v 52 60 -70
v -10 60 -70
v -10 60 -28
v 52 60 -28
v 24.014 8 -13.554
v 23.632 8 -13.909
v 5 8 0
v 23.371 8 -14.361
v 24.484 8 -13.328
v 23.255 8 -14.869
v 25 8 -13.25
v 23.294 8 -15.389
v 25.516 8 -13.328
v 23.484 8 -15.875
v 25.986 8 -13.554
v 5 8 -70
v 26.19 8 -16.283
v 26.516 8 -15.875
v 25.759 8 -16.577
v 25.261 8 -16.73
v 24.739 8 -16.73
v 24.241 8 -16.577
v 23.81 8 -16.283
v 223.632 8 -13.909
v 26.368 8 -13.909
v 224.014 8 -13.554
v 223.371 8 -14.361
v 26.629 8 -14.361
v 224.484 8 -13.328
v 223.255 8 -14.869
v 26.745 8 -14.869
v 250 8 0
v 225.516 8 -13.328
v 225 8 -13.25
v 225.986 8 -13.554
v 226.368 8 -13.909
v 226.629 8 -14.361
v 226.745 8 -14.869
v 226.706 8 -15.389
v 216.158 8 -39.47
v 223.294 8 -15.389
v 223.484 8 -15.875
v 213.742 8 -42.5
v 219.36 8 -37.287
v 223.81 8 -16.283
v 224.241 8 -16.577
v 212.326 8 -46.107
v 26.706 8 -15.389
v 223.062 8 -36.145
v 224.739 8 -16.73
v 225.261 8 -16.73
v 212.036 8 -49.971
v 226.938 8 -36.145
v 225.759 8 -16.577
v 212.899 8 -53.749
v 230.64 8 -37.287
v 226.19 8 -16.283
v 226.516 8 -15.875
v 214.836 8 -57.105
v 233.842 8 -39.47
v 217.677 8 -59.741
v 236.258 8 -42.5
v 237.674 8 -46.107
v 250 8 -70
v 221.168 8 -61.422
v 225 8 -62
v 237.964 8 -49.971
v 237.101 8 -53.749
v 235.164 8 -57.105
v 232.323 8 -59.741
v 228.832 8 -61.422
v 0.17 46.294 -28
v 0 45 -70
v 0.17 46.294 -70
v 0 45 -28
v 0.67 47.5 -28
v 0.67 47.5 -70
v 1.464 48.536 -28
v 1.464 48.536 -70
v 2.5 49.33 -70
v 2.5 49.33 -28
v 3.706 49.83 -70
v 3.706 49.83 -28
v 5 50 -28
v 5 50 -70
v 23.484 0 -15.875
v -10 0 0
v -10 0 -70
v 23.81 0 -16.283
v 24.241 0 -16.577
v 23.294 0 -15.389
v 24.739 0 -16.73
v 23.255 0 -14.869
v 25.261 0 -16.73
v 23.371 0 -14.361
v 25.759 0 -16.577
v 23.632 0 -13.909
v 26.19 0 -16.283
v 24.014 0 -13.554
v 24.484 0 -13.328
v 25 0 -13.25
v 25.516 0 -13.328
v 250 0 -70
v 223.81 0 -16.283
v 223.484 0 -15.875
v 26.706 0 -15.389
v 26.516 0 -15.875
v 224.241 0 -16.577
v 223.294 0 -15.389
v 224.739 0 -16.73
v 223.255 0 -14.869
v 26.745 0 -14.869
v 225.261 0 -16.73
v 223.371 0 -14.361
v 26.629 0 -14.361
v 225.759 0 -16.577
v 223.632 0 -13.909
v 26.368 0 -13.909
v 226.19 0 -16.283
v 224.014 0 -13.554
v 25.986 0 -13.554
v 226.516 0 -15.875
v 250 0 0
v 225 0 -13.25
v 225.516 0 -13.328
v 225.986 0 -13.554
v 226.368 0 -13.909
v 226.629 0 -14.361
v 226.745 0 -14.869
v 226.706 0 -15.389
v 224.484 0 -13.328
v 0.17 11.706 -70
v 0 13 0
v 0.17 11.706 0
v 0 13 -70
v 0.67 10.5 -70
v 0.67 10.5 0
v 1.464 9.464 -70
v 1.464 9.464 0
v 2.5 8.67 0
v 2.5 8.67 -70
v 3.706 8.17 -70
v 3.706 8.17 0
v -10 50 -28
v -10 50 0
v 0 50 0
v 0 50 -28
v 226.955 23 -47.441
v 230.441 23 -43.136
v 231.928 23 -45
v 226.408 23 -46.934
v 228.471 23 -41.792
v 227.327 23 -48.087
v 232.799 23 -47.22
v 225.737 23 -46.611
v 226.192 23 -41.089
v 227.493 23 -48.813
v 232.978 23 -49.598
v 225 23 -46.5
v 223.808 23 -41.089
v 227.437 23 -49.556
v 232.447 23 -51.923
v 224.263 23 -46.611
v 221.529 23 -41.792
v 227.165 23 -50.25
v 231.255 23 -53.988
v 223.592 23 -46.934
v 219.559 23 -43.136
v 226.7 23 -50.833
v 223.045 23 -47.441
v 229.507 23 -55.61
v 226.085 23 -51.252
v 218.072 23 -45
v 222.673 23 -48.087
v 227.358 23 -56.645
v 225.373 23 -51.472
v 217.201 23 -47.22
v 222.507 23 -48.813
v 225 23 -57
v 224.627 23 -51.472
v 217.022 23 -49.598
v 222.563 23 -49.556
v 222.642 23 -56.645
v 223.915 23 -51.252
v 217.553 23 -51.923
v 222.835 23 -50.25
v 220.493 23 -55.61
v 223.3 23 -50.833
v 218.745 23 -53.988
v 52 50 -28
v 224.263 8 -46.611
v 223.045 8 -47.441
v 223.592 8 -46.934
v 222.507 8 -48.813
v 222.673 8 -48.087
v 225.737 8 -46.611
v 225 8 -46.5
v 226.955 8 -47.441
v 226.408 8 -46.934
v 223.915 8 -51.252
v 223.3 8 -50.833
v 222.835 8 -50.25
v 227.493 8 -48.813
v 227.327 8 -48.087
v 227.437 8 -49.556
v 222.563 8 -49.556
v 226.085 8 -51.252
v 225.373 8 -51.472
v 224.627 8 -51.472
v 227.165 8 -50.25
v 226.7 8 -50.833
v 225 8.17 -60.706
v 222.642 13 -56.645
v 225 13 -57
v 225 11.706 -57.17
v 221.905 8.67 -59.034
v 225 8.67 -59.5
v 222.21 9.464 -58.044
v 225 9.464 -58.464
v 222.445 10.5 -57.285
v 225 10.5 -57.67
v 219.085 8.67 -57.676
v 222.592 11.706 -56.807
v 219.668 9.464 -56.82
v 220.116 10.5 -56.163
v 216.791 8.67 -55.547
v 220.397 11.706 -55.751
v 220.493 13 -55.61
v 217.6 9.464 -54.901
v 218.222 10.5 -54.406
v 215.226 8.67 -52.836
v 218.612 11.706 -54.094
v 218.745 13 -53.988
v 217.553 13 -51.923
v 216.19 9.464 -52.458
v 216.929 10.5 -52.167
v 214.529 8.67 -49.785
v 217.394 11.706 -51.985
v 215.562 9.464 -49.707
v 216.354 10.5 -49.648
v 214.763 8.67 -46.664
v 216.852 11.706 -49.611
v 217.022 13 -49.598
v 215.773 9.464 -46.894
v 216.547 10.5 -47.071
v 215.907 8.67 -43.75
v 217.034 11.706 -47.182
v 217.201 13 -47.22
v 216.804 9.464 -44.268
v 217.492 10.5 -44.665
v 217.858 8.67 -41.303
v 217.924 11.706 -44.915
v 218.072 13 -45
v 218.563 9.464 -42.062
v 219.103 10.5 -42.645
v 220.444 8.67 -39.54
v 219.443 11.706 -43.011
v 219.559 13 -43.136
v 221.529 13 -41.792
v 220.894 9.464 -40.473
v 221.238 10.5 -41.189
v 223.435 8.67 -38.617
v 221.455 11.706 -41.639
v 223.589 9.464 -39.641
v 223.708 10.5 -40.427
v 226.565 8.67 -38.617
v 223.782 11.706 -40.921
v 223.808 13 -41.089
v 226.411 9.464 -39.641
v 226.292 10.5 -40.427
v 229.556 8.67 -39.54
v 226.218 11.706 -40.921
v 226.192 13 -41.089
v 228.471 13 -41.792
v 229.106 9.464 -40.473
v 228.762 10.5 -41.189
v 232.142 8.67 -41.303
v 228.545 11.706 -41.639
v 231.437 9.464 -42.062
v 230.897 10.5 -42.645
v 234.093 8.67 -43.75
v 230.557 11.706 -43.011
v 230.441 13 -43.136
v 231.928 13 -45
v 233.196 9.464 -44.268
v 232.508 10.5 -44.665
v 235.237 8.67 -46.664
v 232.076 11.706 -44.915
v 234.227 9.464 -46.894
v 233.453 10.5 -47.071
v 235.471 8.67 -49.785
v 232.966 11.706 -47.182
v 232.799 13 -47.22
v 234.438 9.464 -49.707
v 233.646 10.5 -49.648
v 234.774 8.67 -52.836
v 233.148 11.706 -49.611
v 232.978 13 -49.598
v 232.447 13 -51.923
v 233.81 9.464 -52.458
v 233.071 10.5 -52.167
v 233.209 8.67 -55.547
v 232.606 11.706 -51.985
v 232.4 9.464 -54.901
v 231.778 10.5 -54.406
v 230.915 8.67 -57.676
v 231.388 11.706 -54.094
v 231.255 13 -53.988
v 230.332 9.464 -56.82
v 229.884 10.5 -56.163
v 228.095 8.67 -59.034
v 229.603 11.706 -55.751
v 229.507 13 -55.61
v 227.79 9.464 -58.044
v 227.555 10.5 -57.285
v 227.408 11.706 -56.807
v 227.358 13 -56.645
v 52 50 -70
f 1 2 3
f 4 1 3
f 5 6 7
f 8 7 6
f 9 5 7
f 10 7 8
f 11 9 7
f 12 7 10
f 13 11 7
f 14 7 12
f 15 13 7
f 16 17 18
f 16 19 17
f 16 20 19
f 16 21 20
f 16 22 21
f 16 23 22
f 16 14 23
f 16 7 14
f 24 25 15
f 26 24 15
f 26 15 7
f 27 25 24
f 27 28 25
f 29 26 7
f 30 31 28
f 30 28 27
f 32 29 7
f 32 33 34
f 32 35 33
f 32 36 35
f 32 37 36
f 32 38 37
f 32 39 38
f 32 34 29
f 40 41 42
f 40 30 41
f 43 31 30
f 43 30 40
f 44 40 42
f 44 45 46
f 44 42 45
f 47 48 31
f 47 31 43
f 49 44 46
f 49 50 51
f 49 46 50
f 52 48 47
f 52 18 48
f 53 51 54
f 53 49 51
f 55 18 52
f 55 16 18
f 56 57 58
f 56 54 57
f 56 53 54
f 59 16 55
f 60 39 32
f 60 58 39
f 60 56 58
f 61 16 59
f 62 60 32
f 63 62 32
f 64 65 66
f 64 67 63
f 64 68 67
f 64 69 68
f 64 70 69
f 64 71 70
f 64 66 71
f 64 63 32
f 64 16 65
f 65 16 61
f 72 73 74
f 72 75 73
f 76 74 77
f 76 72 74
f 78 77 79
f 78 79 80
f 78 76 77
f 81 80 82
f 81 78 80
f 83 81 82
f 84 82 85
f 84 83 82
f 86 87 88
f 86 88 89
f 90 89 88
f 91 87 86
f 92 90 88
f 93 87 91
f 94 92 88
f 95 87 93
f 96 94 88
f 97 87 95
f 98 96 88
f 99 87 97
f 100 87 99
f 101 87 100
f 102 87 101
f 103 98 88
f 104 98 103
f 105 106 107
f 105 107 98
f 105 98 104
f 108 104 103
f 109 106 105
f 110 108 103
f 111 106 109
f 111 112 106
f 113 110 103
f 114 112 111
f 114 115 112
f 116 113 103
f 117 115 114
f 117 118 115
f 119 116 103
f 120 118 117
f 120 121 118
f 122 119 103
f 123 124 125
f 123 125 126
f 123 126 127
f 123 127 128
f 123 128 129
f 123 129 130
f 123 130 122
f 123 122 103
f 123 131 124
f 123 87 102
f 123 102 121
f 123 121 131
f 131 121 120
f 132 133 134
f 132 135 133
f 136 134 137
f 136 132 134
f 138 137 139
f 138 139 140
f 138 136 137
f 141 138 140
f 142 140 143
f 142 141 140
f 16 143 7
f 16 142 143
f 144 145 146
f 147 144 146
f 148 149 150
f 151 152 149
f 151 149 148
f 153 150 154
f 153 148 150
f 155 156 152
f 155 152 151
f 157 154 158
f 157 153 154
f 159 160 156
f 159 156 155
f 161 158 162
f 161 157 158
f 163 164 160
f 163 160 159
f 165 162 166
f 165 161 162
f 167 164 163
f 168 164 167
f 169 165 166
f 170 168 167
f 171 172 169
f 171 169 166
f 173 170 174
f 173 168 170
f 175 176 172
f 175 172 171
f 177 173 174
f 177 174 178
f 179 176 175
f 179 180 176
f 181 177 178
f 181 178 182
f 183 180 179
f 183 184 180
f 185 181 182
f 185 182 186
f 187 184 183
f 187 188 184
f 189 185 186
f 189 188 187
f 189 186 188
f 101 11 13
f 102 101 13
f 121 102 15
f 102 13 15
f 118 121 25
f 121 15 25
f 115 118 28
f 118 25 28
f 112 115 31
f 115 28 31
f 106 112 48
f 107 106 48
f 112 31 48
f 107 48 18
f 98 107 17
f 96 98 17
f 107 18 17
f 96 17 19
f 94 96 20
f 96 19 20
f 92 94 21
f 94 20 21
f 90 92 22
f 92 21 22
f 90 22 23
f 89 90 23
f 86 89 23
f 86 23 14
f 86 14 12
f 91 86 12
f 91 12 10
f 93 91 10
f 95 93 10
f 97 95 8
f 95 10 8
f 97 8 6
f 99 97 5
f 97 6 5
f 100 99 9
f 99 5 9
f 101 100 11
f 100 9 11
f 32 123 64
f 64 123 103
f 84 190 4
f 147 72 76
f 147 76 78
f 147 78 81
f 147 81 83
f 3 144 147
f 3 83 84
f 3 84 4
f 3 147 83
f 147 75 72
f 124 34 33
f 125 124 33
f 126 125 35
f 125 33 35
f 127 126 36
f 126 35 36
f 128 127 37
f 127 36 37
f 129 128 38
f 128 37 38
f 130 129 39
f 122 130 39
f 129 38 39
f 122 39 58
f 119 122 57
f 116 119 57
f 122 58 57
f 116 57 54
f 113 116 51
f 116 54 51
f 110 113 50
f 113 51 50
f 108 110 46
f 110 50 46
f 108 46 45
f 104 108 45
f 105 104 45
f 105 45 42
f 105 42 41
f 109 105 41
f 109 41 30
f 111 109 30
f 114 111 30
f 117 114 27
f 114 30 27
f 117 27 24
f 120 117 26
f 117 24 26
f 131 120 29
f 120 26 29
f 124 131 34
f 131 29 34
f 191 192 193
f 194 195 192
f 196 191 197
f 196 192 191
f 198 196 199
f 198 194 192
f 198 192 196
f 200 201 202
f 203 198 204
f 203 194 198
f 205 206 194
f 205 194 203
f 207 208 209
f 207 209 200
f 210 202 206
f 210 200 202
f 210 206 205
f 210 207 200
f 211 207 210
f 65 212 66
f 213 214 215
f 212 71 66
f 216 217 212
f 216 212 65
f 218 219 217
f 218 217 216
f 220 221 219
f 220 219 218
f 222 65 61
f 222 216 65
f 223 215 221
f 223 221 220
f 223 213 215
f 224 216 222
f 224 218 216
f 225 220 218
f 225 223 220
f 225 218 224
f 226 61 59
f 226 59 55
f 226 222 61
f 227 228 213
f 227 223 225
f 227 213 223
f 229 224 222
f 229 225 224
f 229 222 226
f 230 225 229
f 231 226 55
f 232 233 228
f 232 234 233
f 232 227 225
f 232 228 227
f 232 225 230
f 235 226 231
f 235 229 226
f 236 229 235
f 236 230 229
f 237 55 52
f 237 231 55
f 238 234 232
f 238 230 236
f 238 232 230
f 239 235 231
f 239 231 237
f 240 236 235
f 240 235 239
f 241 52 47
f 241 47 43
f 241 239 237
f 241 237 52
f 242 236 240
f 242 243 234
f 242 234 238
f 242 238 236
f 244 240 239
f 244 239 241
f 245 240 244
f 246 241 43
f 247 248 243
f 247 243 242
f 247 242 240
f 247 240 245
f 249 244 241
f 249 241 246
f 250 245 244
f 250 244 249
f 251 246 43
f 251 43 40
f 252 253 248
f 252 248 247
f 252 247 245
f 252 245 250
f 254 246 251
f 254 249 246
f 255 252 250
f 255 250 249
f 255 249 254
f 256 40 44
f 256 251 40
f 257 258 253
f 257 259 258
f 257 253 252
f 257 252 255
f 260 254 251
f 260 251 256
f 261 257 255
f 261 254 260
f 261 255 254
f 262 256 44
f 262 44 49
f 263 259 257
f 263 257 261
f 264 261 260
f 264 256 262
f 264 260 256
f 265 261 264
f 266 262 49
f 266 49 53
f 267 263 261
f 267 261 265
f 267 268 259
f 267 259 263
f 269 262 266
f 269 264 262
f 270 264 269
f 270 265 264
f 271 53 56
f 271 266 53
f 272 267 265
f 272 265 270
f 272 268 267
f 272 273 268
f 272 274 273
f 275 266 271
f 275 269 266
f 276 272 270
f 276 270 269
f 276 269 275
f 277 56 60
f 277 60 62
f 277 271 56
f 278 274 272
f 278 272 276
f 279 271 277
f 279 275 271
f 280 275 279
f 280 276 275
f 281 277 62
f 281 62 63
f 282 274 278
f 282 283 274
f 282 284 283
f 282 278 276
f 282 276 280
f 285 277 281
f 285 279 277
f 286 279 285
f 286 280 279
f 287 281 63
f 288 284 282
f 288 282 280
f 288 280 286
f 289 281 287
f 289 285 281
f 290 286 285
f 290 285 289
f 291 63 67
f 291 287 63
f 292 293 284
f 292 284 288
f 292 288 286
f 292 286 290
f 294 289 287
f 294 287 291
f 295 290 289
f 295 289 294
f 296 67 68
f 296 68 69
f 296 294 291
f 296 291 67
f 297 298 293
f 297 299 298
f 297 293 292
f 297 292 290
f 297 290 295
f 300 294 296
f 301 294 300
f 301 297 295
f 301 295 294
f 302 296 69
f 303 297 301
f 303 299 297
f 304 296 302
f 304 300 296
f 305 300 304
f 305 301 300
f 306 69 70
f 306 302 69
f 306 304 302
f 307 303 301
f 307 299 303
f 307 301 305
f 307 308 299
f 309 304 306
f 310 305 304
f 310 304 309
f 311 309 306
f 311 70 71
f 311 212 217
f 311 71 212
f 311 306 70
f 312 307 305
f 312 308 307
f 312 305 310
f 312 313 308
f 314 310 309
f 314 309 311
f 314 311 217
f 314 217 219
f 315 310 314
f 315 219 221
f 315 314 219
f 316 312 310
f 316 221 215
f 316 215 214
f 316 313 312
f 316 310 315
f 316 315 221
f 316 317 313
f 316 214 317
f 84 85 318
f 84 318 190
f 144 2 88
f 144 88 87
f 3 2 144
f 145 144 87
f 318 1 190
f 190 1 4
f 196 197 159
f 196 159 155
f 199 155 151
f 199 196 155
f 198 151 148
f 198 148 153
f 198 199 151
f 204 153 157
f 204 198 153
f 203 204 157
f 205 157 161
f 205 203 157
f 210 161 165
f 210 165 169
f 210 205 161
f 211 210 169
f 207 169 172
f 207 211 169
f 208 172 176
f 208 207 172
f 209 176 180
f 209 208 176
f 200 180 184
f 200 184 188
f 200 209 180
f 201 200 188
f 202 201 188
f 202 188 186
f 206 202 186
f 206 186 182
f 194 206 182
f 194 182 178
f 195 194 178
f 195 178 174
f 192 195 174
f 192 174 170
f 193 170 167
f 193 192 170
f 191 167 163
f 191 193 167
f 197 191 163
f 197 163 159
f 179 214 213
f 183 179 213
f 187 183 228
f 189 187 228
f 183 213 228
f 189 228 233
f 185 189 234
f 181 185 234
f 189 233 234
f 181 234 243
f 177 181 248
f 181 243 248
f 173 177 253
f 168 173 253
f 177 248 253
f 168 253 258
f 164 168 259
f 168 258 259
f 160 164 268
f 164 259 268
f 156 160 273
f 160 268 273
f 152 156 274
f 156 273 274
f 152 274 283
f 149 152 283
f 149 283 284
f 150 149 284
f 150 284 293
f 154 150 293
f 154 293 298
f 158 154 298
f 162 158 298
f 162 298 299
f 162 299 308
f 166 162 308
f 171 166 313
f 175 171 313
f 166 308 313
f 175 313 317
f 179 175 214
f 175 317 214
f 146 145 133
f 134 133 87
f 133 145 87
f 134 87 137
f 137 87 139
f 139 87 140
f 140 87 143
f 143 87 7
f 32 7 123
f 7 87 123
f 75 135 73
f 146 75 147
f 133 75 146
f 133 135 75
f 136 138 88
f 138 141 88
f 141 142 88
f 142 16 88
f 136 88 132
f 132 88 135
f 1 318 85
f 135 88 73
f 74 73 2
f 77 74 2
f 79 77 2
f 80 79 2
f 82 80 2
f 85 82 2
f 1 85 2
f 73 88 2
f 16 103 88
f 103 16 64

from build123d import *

# Parameters (mm, degrees)
SKETCH_1_W          = 250
SKETCH_1_H          = 70
EXTRUDE_1_DEPTH     = 8
SKETCH_2_R          = 1.75
CUT_EXTRUDE_1_DEPTH = 8
SKETCH_3_W          = 10
SKETCH_3_H          = 70
EXTRUDE_2_DEPTH     = 50
SKETCH_4_W          = 42
SKETCH_4_H          = 10
EXTRUDE_3_DEPTH     = 62
FILLET_2_R          = 5
SKETCH_6_R          = 8
SKETCH_6_R_2        = 2.5
EXTRUDE_4_DEPTH     = 15
FILLET_3_R          = 5


with BuildPart() as part:
    # 草图1 → 凸台-拉伸1 (new body)
    with BuildSketch(Plane(origin=(0, 0, 0), x_dir=(1, 0, 0), z_dir=(0, 1, 0))):
        with Locations((125, 35)):
            Rectangle(SKETCH_1_W, SKETCH_1_H)
    extrude(amount=EXTRUDE_1_DEPTH)

    # 草图2 → 切除-拉伸1 (cut)
    with BuildSketch(Plane(origin=(0, 8, 0), x_dir=(1, 0, 0), z_dir=(0, 1, 0))):
        with Locations(Location((25, 15, 0), (0, 0, 270))):
            Circle(SKETCH_2_R)
        with Locations(Location((225, 15, 0), (0, 0, 270))):
            Circle(SKETCH_2_R)
    extrude(amount=-CUT_EXTRUDE_1_DEPTH, mode=Mode.SUBTRACT)

    # 草图3 → 凸台-拉伸2 (add)
    with BuildSketch(Plane.XZ):
        with Locations((-5, -35)):
            Rectangle(SKETCH_3_W, SKETCH_3_H)
    extrude(amount=-EXTRUDE_2_DEPTH)

    # 草图4 → 凸台-拉伸3 (add)
    with BuildSketch(Plane.ZY.offset(10)):
        with Locations((-49, 55)):
            Rectangle(SKETCH_4_W, SKETCH_4_H)
    extrude(amount=-EXTRUDE_3_DEPTH)

    # 圆角2
    fillet_2_edges = [part.edges().sort_by_distance(p)[0] for p in [
        (0, 50, -49),
        (0, 8, -35),
    ]]
    fillet(fillet_2_edges, radius=FILLET_2_R)

    # 草图6 → 凸台-拉伸4 (add)
    with BuildSketch(Plane(origin=(0, 8, 0), x_dir=(1, 0, 0), z_dir=(0, 1, 0))):
        with Locations(Location((225, 49, 0), (0, 0, 90))):
            Circle(SKETCH_6_R)
        with Locations(Location((225, 49, 0), (0, 0, 270))):
            Circle(SKETCH_6_R_2, mode=Mode.SUBTRACT)
    extrude(amount=EXTRUDE_4_DEPTH)

    # 圆角3
    fillet_3_edges = [part.edges().sort_by_distance(p)[0] for p in [
        (225, 8, -41),
    ]]
    fillet(fillet_3_edges, radius=FILLET_3_R)


solid = part.part
